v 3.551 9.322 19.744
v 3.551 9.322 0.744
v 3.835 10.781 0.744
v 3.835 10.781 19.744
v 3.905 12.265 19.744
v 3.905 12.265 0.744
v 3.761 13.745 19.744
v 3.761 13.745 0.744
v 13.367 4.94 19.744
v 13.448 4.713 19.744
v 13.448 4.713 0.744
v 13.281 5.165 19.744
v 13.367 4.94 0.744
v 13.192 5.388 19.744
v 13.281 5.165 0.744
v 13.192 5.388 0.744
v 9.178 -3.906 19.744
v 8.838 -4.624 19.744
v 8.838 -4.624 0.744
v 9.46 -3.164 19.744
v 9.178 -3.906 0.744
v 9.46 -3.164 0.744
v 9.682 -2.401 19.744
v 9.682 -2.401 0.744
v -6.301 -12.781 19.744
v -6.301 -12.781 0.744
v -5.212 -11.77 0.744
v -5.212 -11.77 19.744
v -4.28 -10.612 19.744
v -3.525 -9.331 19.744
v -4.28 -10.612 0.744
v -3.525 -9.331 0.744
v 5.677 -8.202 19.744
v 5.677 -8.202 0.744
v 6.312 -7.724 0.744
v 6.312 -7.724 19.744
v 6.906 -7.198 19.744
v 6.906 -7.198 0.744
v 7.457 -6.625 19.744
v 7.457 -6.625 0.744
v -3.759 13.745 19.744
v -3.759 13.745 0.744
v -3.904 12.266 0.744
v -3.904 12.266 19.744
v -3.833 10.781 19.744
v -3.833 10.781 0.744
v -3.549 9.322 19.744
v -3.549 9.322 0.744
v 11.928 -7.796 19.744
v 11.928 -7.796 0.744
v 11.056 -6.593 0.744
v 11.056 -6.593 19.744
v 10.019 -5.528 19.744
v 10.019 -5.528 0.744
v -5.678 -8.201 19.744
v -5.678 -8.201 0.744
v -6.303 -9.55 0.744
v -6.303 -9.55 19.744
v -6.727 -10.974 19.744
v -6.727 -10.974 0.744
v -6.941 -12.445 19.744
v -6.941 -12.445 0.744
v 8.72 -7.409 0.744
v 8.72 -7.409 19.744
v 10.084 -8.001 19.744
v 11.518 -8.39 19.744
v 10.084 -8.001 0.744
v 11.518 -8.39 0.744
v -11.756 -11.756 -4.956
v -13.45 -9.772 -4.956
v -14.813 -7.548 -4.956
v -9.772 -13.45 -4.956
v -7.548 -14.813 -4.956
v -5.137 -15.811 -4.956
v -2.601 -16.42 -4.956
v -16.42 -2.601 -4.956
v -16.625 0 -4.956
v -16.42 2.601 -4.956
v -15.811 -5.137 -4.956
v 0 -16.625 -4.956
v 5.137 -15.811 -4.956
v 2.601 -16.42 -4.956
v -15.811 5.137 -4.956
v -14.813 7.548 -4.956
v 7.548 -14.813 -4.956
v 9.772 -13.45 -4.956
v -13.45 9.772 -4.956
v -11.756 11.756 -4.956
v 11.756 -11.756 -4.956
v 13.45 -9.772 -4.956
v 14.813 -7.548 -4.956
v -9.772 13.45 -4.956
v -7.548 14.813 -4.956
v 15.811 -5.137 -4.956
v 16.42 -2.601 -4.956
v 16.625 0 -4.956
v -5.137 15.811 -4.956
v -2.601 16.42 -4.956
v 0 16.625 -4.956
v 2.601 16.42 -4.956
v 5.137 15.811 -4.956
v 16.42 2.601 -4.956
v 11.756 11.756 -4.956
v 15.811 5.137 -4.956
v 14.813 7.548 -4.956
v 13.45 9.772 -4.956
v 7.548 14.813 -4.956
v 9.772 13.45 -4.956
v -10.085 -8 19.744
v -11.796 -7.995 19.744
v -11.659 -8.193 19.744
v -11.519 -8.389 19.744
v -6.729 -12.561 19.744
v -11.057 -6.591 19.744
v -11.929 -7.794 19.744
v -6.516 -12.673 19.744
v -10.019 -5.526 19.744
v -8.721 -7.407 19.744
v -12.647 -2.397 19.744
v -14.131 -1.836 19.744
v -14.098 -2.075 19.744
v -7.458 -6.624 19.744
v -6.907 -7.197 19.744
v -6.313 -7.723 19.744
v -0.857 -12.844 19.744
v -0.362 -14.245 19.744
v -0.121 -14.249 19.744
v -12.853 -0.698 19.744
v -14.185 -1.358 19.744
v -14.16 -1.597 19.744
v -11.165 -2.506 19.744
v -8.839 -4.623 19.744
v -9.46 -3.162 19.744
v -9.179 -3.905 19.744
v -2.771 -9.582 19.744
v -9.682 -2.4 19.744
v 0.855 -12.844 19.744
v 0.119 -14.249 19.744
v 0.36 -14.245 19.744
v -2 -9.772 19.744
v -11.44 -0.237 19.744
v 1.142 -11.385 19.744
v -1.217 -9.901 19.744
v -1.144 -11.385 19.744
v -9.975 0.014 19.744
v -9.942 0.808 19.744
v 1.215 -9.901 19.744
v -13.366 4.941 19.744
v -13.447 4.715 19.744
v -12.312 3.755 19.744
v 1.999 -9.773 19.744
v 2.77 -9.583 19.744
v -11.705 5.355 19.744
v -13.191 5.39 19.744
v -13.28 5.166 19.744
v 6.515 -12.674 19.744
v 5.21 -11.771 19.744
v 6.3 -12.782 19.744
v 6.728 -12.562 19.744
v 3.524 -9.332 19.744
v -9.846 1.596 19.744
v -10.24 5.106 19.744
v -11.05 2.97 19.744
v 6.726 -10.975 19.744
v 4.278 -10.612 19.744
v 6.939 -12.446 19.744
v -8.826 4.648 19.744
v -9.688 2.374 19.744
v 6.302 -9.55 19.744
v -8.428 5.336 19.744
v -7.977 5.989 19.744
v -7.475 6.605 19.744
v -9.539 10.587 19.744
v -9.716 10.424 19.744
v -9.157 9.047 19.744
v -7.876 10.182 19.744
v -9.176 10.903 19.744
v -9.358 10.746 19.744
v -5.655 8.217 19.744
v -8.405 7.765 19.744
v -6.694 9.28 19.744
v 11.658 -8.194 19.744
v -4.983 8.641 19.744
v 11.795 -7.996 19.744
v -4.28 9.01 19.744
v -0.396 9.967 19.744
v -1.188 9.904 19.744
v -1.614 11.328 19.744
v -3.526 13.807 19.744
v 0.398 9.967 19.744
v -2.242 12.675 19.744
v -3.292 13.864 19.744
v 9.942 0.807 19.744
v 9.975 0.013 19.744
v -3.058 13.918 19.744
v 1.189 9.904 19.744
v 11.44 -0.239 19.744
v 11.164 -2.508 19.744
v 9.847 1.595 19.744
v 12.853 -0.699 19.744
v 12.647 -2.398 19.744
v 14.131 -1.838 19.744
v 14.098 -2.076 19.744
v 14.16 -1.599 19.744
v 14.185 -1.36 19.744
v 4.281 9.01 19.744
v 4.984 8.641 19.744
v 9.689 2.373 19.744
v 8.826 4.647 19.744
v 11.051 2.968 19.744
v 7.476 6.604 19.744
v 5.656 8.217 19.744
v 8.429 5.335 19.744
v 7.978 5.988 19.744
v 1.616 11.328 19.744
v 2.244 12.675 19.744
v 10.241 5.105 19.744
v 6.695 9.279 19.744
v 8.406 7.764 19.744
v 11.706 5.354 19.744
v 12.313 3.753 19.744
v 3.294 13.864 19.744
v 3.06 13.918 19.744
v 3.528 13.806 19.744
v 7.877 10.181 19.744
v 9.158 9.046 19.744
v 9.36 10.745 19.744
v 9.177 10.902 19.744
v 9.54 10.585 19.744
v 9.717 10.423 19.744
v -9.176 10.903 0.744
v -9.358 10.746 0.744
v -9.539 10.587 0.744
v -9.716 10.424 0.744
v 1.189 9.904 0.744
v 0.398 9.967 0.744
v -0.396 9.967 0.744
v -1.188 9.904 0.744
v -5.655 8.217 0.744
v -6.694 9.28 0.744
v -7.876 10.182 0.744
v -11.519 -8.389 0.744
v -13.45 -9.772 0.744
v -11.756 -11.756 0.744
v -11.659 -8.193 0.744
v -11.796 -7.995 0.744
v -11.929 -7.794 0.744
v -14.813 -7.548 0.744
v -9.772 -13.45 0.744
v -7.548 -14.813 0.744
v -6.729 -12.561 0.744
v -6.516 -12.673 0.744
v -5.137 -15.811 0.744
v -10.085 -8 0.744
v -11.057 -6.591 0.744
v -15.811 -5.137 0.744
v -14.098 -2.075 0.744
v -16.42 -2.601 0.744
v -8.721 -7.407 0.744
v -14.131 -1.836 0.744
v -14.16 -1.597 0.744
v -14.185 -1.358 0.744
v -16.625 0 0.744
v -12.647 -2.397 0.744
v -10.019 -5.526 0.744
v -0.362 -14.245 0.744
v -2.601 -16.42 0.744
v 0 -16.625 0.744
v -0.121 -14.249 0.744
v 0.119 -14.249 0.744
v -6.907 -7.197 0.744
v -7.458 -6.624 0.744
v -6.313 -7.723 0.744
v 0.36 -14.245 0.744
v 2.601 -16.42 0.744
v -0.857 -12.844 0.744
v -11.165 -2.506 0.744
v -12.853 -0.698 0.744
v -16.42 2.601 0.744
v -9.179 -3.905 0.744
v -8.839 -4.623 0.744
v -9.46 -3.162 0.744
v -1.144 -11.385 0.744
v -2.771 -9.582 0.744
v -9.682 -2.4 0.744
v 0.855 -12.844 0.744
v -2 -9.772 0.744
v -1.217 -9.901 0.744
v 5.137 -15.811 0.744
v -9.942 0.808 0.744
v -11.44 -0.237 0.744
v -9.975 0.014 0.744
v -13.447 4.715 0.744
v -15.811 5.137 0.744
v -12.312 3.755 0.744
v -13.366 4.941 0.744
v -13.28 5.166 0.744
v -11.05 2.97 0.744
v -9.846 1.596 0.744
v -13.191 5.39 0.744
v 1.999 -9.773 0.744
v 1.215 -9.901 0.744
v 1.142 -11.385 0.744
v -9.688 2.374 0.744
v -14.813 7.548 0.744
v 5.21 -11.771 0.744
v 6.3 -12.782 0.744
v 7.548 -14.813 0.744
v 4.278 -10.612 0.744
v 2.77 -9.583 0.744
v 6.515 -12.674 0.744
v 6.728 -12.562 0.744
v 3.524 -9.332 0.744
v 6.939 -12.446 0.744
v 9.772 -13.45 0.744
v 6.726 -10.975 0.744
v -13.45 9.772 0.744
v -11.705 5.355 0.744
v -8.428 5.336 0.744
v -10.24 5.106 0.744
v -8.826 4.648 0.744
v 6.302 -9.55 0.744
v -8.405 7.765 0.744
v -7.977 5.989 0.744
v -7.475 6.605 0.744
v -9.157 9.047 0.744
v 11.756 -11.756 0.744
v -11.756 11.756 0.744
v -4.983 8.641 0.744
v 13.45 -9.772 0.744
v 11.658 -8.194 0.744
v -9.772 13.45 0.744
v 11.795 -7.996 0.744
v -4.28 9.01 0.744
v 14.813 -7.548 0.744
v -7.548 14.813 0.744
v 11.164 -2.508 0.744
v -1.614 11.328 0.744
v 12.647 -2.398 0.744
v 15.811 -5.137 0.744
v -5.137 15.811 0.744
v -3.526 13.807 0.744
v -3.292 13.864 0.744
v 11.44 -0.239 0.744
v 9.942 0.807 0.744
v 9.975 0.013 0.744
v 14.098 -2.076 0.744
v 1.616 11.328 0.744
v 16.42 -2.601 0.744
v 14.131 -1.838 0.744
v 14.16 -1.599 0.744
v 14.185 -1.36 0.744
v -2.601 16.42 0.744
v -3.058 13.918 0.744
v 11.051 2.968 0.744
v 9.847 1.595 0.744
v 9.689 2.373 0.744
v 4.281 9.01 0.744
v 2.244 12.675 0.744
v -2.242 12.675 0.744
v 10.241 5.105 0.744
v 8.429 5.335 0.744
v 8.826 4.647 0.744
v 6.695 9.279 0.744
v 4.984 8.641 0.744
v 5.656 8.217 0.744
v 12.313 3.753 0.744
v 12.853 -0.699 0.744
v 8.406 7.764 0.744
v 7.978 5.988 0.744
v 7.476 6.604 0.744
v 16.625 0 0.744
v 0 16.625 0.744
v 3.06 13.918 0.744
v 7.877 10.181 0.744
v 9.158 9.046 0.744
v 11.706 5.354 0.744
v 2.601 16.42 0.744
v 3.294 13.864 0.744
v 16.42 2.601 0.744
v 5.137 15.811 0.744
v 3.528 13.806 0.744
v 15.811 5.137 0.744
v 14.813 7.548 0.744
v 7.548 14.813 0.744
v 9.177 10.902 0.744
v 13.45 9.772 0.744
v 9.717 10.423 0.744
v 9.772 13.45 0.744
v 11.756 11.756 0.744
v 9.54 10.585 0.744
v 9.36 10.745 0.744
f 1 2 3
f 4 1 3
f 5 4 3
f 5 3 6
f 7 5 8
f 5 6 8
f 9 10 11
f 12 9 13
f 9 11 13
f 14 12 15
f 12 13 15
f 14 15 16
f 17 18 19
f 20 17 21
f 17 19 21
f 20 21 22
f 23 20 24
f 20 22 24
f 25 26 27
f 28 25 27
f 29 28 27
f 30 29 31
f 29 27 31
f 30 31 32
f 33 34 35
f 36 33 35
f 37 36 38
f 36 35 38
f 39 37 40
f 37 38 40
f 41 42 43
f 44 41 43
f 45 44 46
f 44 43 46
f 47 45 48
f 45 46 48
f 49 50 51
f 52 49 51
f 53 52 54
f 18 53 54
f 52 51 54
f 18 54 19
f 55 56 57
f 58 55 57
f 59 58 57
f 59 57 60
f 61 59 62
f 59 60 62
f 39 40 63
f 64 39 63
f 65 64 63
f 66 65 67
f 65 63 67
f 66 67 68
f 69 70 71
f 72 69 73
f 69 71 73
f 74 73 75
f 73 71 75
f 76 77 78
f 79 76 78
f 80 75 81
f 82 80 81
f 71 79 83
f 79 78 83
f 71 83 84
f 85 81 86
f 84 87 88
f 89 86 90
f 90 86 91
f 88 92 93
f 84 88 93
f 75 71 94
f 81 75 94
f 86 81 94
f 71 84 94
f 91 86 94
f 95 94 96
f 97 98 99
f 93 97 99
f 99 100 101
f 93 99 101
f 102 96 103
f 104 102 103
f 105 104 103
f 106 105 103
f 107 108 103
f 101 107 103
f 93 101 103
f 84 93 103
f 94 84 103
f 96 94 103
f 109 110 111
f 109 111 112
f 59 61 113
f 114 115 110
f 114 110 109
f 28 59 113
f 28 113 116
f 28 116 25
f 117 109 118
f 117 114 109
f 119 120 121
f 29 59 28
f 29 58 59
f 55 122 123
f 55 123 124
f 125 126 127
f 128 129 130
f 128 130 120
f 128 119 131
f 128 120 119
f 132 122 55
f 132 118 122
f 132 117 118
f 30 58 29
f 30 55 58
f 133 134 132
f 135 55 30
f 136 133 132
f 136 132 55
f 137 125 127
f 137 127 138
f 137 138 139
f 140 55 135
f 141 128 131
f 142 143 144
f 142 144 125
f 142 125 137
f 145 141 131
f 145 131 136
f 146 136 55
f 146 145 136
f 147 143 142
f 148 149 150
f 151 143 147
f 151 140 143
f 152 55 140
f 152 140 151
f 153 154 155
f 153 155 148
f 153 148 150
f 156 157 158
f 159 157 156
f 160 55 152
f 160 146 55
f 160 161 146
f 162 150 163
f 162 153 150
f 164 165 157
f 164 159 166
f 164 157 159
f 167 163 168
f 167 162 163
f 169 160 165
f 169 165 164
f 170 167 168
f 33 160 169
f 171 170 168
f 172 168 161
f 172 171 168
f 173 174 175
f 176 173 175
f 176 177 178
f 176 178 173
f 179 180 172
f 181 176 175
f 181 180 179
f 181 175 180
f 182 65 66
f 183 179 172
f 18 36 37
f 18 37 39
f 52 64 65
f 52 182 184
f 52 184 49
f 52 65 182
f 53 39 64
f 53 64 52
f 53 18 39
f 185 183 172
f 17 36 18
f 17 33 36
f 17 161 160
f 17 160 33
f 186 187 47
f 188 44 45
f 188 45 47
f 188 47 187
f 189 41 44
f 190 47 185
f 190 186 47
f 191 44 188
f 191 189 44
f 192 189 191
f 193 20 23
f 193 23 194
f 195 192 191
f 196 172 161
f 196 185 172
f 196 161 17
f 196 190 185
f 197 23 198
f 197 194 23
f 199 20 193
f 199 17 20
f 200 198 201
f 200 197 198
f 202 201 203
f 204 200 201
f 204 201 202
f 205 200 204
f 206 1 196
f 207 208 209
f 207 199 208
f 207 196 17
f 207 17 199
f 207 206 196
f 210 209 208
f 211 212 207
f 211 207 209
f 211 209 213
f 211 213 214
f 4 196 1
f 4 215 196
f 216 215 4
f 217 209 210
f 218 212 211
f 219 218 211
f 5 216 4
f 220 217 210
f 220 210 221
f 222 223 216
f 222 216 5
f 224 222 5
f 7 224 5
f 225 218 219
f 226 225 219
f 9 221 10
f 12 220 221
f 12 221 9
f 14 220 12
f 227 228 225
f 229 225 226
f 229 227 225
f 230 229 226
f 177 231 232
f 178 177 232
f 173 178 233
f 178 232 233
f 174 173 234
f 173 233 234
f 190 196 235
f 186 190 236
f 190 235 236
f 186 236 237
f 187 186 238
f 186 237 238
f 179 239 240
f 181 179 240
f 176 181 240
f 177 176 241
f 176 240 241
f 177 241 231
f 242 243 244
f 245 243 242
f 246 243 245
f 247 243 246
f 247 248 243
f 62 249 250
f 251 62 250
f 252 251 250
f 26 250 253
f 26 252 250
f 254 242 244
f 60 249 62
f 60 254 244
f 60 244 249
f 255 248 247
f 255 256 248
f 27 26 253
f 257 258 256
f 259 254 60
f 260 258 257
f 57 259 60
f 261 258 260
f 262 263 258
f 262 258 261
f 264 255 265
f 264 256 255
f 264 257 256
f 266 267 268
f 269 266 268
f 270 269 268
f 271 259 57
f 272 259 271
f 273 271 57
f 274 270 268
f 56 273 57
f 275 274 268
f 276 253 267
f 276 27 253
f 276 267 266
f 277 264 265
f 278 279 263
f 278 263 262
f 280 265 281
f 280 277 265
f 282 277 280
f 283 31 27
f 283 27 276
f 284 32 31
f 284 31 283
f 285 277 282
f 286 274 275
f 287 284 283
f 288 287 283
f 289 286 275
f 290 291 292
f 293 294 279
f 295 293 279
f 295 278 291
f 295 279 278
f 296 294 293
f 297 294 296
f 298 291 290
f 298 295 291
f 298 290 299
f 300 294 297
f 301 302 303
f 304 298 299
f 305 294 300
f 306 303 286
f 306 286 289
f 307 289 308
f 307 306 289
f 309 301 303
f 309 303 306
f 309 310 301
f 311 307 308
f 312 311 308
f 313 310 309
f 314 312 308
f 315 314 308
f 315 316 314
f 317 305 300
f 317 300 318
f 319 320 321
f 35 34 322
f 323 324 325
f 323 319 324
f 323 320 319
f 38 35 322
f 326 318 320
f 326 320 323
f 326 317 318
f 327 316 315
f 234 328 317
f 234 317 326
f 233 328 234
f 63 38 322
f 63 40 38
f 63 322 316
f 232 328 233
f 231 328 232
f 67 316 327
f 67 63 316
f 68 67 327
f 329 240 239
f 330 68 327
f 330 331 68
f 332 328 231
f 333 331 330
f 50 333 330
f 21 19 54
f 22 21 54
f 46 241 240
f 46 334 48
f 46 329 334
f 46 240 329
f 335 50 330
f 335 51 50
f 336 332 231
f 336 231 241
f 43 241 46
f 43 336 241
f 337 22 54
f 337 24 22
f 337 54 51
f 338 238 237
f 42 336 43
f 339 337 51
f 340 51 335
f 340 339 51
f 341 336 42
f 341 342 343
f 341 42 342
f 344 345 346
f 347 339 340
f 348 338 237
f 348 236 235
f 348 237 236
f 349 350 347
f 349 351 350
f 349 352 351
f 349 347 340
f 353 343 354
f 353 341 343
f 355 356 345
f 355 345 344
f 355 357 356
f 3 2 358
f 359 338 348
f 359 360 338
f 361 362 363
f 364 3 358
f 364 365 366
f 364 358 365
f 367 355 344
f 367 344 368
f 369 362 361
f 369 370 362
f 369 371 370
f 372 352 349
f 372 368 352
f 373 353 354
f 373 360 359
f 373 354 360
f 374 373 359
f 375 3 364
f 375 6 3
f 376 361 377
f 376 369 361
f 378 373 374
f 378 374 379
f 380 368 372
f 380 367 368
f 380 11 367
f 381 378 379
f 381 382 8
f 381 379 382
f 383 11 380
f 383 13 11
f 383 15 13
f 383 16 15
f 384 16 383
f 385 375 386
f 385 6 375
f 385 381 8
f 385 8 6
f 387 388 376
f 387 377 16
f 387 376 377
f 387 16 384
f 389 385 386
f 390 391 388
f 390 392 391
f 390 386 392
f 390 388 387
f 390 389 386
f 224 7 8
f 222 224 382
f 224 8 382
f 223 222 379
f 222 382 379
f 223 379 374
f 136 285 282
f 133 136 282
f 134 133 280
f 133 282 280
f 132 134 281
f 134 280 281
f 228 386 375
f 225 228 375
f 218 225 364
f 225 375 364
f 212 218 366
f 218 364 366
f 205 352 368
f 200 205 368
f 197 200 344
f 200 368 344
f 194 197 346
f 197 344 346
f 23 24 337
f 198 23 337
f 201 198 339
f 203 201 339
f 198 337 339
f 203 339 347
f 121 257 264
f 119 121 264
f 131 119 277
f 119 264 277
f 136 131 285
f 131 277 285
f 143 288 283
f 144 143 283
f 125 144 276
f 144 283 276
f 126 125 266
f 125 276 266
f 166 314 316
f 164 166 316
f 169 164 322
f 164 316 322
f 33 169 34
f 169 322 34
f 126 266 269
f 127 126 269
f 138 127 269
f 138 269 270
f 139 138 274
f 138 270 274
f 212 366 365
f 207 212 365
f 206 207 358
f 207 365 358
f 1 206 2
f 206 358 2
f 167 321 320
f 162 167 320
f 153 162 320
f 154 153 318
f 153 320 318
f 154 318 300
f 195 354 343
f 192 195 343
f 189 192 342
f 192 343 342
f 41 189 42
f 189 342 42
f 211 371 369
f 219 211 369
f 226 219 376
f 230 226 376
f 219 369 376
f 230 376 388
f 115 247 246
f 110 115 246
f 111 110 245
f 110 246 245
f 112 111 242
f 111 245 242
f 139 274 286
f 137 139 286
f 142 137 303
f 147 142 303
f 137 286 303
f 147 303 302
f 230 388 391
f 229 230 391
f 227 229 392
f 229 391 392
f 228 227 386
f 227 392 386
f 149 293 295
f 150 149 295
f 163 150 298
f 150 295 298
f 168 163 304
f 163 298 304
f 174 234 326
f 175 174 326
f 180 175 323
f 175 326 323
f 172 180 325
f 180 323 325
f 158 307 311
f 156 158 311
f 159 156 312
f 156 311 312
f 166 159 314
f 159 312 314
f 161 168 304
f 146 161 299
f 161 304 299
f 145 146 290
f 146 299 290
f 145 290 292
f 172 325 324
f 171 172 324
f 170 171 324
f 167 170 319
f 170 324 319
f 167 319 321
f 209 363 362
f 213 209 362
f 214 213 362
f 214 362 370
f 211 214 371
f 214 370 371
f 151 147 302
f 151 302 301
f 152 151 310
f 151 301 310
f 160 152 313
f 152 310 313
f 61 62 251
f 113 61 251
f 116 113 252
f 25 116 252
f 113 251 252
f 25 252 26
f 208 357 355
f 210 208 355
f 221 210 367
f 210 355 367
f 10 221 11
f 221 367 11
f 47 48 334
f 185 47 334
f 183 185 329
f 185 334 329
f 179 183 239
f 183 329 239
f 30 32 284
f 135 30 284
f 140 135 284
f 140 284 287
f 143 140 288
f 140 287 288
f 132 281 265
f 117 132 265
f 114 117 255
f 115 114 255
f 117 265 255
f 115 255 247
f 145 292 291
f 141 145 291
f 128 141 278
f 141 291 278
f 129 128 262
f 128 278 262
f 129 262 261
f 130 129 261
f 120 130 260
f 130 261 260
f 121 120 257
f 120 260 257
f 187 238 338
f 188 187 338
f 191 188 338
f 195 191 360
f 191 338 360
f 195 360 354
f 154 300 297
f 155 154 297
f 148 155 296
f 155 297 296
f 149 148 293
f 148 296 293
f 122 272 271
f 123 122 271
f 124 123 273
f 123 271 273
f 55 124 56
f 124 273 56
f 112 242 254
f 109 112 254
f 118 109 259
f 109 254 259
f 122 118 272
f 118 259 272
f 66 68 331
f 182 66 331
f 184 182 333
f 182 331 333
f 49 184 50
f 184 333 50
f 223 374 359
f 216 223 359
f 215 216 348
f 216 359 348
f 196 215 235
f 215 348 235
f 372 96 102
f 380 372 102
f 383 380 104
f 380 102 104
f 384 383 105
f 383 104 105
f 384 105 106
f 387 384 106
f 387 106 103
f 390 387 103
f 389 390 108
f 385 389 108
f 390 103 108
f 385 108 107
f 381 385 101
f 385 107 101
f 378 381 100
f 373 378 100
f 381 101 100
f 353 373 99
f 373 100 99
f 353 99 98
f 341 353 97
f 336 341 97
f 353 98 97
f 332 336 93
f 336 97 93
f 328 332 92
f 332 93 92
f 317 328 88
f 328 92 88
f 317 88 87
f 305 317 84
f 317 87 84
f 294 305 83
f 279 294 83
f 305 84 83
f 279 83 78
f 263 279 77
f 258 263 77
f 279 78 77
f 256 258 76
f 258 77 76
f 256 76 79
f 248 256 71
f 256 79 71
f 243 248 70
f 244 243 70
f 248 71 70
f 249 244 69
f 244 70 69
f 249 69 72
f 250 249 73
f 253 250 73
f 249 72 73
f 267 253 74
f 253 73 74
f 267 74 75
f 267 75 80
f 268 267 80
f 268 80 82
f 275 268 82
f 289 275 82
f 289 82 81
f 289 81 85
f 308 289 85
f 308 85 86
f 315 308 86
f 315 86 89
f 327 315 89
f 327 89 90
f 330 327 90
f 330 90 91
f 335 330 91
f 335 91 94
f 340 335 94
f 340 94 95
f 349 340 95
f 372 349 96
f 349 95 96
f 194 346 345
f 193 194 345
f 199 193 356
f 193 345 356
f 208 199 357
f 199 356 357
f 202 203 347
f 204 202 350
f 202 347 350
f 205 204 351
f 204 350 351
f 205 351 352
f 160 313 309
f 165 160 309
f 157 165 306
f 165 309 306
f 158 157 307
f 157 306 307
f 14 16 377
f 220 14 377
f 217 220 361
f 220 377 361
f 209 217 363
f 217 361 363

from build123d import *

# Parameters (mm, degrees)
SKETCH1_R           = 8.75
BOSS_EXTRUDE1_DEPTH = 3
BOSS_EXTRUDE2_DEPTH = 10
SCALE1_SCALE        = 1.9


with BuildPart() as part:
    # Sketch1 → Boss-Extrude1 (new body)
    with BuildSketch(Plane.XY):
        Circle(SKETCH1_R)
    extrude(amount=BOSS_EXTRUDE1_DEPTH)

    # Sketch2 → Boss-Extrude2 (add)
    with BuildSketch(Plane.XY.offset(3)):
        with BuildLine():
            ThreePointArc((4.829991895, 5.737697996), (3.826186326, 5.132311911), (2.976672459, 4.324571779))
            ThreePointArc((2.976672459, 4.324571779), (2.440108702, 4.648480345), (1.868768811, 4.906139331))
            ThreePointArc((1.868768811, 4.906139331), (2.051102492, 6.064099762), (1.979255999, 7.234123699))
            ThreePointArc((1.979255999, 7.234123699), (1.795356309, 7.281943128), (1.610304214, 7.325088418))
            ThreePointArc((1.610304214, 7.325088418), (1.002815466, 6.322553954), (0.62598385, 5.212546807))
            ThreePointArc((0.62598385, 5.212546807), (0.000352422, 5.249999988), (-0.625284028, 5.212630803))
            ThreePointArc((-0.625284028, 5.212630803), (-1.001966616, 6.322688531), (-1.609320762, 7.325304546))
            ThreePointArc((-1.609320762, 7.325304546), (-1.794378647, 7.2821841), (-1.978284756, 7.234389361))
            ThreePointArc((-1.978284756, 7.234389361), (-2.050288332, 6.06437508), (-1.868110115, 4.90639018))
            ThreePointArc((-1.868110115, 4.90639018), (-2.439484593, 4.648807903), (-2.976091832, 4.324971377))
            ThreePointArc((-2.976091832, 4.324971377), (-3.825497247, 5.132825554), (-4.82922153, 5.738346401))
            ThreePointArc((-4.82922153, 5.738346401), (-4.97304308, 5.614164455), (-5.113672529, 5.486378884))
            ThreePointArc((-5.113672529, 5.486378884), (-4.633695781, 4.41692096), (-3.934242565, 3.476238691))
            ThreePointArc((-3.934242565, 3.476238691), (-4.320465088, 2.982629951), (-4.645112863, 2.44651313))
            ThreePointArc((-4.645112863, 2.44651313), (-5.772652562, 2.7670941), (-6.942805845, 2.83680225))
            ThreePointArc((-6.942805845, 2.83680225), (-7.012443275, 2.66000739), (-7.077579552, 2.481505124))
            ThreePointArc((-7.077579552, 2.481505124), (-6.15557937, 1.757603477), (-5.099087457, 1.249722811))
            ThreePointArc((-5.099087457, 1.249722811), (-5.211679097, 0.633167423), (-5.249994516, 0.007588209))
            ThreePointArc((-5.249994516, 0.007588209), (-6.397362742, -0.232545265), (-7.46587701, -0.71461911))
            ThreePointArc((-7.46587701, -0.71461911), (-7.445377224, -0.90352531), (-7.420098394, -1.091851556))
            ThreePointArc((-7.420098394, -1.091851556), (-6.267293907, -1.304359781), (-5.095792863, -1.263089504))
            ThreePointArc((-5.095792863, -1.263089504), (-4.908960234, -1.861346132), (-4.652165695, -2.43307508))
            ThreePointArc((-4.652165695, -2.43307508), (-5.556514215, -3.178911313), (-6.278605726, -4.102329843))
            ThreePointArc((-6.278605726, -4.102329843), (-6.172664978, -4.260071251), (-6.062762116, -4.415078202))
            ThreePointArc((-6.062762116, -4.415078202), (-4.94324694, -4.067509932), (-3.925113535, -3.486543236))
            ThreePointArc((-3.925113535, -3.486543236), (-3.48165774, -3.92944772), (-2.988581778, -4.316350189))
            ThreePointArc((-2.988581778, -4.316350189), (-3.442735244, -5.397027088), (-3.652981535, -6.550246247))
            ThreePointArc((-3.652981535, -6.550246247), (-3.485869574, -6.640686208), (-3.316520101, -6.726863639))
            ThreePointArc((-3.316520101, -6.726863639), (-2.486761671, -5.898842577), (-1.855237999, -4.91127193))
            ThreePointArc((-1.855237999, -4.91127193), (-1.256749416, -5.09736019), (-0.640349792, -5.210801488))
            ThreePointArc((-0.640349792, -5.210801488), (-0.540267119, -6.378748999), (-0.190503298, -7.497580176))
            ThreePointArc((-0.190503298, -7.497580176), (-0.00050346, -7.499999983), (0.189496701, -7.497605685))
            ThreePointArc((0.189496701, -7.497605685), (0.539410728, -6.378821476), (0.639650205, -5.210887412))
            ThreePointArc((0.639650205, -5.210887412), (1.256065053, -5.09752887), (1.854578614, -4.911520962))
            ThreePointArc((1.854578614, -4.911520962), (2.485969693, -5.899176387), (3.315616949, -6.727308842))
            ThreePointArc((3.315616949, -6.727308842), (3.48497799, -6.641154147), (3.652102092, -6.550736623))
            ThreePointArc((3.652102092, -6.550736623), (3.44201063, -5.397489248), (2.988002255, -4.316751385))
            ThreePointArc((2.988002255, -4.316751385), (3.481130156, -3.929915118), (3.92464541, -3.487070175))
            ThreePointArc((3.92464541, -3.487070175), (4.942700807, -4.068173557), (6.06216931, -4.415892125))
            ThreePointArc((6.06216931, -4.415892125), (6.172092982, -4.260899931), (6.278054907, -4.103172747))
            ThreePointArc((6.278054907, -4.103172747), (5.556087377, -3.17965728), (4.651838998, -2.433699639))
            ThreePointArc((4.651838998, -2.433699639), (4.908710292, -1.862005173), (5.09562324, -1.263773634))
            ThreePointArc((5.09562324, -1.263773634), (6.267118732, -1.305201192), (7.41995174, -1.092847739))
            ThreePointArc((7.41995174, -1.092847739), (7.445255854, -0.904524889), (7.465781001, -0.715621443))
            ThreePointArc((7.465781001, -0.715621443), (6.397331464, -0.233404148), (5.249995488, 0.006883365))
            ThreePointArc((5.249995488, 0.006883365), (5.211764057, 0.632467717), (5.099255194, 1.249038216))
            ThreePointArc((5.099255194, 1.249038216), (6.155815283, 1.756777037), (7.077912646, 2.480554893))
            ThreePointArc((7.077912646, 2.480554893), (7.012800334, 2.659065903), (6.94318664, 2.83587011))
            ThreePointArc((6.94318664, 2.83587011), (5.773024009, 2.766319061), (4.64544128, 2.445889473))
            ThreePointArc((4.64544128, 2.445889473), (4.320865485, 2.982049876), (3.934709236, 3.475710464))
            ThreePointArc((3.934709236, 3.475710464), (4.634288738, 4.416298818), (5.114409063, 5.485692293))
            ThreePointArc((5.114409063, 5.485692293), (4.973796771, 5.613496743), (4.829991895, 5.737697996))
        make_face()
    extrude(amount=BOSS_EXTRUDE2_DEPTH)


with BuildPart() as part_1:
    # Scale1: scaled about (0, 0, 5.507121535)
    add(part.part.scale(SCALE1_SCALE).moved(Location((0, 0, -4.956409381))))


solid = part_1.part
